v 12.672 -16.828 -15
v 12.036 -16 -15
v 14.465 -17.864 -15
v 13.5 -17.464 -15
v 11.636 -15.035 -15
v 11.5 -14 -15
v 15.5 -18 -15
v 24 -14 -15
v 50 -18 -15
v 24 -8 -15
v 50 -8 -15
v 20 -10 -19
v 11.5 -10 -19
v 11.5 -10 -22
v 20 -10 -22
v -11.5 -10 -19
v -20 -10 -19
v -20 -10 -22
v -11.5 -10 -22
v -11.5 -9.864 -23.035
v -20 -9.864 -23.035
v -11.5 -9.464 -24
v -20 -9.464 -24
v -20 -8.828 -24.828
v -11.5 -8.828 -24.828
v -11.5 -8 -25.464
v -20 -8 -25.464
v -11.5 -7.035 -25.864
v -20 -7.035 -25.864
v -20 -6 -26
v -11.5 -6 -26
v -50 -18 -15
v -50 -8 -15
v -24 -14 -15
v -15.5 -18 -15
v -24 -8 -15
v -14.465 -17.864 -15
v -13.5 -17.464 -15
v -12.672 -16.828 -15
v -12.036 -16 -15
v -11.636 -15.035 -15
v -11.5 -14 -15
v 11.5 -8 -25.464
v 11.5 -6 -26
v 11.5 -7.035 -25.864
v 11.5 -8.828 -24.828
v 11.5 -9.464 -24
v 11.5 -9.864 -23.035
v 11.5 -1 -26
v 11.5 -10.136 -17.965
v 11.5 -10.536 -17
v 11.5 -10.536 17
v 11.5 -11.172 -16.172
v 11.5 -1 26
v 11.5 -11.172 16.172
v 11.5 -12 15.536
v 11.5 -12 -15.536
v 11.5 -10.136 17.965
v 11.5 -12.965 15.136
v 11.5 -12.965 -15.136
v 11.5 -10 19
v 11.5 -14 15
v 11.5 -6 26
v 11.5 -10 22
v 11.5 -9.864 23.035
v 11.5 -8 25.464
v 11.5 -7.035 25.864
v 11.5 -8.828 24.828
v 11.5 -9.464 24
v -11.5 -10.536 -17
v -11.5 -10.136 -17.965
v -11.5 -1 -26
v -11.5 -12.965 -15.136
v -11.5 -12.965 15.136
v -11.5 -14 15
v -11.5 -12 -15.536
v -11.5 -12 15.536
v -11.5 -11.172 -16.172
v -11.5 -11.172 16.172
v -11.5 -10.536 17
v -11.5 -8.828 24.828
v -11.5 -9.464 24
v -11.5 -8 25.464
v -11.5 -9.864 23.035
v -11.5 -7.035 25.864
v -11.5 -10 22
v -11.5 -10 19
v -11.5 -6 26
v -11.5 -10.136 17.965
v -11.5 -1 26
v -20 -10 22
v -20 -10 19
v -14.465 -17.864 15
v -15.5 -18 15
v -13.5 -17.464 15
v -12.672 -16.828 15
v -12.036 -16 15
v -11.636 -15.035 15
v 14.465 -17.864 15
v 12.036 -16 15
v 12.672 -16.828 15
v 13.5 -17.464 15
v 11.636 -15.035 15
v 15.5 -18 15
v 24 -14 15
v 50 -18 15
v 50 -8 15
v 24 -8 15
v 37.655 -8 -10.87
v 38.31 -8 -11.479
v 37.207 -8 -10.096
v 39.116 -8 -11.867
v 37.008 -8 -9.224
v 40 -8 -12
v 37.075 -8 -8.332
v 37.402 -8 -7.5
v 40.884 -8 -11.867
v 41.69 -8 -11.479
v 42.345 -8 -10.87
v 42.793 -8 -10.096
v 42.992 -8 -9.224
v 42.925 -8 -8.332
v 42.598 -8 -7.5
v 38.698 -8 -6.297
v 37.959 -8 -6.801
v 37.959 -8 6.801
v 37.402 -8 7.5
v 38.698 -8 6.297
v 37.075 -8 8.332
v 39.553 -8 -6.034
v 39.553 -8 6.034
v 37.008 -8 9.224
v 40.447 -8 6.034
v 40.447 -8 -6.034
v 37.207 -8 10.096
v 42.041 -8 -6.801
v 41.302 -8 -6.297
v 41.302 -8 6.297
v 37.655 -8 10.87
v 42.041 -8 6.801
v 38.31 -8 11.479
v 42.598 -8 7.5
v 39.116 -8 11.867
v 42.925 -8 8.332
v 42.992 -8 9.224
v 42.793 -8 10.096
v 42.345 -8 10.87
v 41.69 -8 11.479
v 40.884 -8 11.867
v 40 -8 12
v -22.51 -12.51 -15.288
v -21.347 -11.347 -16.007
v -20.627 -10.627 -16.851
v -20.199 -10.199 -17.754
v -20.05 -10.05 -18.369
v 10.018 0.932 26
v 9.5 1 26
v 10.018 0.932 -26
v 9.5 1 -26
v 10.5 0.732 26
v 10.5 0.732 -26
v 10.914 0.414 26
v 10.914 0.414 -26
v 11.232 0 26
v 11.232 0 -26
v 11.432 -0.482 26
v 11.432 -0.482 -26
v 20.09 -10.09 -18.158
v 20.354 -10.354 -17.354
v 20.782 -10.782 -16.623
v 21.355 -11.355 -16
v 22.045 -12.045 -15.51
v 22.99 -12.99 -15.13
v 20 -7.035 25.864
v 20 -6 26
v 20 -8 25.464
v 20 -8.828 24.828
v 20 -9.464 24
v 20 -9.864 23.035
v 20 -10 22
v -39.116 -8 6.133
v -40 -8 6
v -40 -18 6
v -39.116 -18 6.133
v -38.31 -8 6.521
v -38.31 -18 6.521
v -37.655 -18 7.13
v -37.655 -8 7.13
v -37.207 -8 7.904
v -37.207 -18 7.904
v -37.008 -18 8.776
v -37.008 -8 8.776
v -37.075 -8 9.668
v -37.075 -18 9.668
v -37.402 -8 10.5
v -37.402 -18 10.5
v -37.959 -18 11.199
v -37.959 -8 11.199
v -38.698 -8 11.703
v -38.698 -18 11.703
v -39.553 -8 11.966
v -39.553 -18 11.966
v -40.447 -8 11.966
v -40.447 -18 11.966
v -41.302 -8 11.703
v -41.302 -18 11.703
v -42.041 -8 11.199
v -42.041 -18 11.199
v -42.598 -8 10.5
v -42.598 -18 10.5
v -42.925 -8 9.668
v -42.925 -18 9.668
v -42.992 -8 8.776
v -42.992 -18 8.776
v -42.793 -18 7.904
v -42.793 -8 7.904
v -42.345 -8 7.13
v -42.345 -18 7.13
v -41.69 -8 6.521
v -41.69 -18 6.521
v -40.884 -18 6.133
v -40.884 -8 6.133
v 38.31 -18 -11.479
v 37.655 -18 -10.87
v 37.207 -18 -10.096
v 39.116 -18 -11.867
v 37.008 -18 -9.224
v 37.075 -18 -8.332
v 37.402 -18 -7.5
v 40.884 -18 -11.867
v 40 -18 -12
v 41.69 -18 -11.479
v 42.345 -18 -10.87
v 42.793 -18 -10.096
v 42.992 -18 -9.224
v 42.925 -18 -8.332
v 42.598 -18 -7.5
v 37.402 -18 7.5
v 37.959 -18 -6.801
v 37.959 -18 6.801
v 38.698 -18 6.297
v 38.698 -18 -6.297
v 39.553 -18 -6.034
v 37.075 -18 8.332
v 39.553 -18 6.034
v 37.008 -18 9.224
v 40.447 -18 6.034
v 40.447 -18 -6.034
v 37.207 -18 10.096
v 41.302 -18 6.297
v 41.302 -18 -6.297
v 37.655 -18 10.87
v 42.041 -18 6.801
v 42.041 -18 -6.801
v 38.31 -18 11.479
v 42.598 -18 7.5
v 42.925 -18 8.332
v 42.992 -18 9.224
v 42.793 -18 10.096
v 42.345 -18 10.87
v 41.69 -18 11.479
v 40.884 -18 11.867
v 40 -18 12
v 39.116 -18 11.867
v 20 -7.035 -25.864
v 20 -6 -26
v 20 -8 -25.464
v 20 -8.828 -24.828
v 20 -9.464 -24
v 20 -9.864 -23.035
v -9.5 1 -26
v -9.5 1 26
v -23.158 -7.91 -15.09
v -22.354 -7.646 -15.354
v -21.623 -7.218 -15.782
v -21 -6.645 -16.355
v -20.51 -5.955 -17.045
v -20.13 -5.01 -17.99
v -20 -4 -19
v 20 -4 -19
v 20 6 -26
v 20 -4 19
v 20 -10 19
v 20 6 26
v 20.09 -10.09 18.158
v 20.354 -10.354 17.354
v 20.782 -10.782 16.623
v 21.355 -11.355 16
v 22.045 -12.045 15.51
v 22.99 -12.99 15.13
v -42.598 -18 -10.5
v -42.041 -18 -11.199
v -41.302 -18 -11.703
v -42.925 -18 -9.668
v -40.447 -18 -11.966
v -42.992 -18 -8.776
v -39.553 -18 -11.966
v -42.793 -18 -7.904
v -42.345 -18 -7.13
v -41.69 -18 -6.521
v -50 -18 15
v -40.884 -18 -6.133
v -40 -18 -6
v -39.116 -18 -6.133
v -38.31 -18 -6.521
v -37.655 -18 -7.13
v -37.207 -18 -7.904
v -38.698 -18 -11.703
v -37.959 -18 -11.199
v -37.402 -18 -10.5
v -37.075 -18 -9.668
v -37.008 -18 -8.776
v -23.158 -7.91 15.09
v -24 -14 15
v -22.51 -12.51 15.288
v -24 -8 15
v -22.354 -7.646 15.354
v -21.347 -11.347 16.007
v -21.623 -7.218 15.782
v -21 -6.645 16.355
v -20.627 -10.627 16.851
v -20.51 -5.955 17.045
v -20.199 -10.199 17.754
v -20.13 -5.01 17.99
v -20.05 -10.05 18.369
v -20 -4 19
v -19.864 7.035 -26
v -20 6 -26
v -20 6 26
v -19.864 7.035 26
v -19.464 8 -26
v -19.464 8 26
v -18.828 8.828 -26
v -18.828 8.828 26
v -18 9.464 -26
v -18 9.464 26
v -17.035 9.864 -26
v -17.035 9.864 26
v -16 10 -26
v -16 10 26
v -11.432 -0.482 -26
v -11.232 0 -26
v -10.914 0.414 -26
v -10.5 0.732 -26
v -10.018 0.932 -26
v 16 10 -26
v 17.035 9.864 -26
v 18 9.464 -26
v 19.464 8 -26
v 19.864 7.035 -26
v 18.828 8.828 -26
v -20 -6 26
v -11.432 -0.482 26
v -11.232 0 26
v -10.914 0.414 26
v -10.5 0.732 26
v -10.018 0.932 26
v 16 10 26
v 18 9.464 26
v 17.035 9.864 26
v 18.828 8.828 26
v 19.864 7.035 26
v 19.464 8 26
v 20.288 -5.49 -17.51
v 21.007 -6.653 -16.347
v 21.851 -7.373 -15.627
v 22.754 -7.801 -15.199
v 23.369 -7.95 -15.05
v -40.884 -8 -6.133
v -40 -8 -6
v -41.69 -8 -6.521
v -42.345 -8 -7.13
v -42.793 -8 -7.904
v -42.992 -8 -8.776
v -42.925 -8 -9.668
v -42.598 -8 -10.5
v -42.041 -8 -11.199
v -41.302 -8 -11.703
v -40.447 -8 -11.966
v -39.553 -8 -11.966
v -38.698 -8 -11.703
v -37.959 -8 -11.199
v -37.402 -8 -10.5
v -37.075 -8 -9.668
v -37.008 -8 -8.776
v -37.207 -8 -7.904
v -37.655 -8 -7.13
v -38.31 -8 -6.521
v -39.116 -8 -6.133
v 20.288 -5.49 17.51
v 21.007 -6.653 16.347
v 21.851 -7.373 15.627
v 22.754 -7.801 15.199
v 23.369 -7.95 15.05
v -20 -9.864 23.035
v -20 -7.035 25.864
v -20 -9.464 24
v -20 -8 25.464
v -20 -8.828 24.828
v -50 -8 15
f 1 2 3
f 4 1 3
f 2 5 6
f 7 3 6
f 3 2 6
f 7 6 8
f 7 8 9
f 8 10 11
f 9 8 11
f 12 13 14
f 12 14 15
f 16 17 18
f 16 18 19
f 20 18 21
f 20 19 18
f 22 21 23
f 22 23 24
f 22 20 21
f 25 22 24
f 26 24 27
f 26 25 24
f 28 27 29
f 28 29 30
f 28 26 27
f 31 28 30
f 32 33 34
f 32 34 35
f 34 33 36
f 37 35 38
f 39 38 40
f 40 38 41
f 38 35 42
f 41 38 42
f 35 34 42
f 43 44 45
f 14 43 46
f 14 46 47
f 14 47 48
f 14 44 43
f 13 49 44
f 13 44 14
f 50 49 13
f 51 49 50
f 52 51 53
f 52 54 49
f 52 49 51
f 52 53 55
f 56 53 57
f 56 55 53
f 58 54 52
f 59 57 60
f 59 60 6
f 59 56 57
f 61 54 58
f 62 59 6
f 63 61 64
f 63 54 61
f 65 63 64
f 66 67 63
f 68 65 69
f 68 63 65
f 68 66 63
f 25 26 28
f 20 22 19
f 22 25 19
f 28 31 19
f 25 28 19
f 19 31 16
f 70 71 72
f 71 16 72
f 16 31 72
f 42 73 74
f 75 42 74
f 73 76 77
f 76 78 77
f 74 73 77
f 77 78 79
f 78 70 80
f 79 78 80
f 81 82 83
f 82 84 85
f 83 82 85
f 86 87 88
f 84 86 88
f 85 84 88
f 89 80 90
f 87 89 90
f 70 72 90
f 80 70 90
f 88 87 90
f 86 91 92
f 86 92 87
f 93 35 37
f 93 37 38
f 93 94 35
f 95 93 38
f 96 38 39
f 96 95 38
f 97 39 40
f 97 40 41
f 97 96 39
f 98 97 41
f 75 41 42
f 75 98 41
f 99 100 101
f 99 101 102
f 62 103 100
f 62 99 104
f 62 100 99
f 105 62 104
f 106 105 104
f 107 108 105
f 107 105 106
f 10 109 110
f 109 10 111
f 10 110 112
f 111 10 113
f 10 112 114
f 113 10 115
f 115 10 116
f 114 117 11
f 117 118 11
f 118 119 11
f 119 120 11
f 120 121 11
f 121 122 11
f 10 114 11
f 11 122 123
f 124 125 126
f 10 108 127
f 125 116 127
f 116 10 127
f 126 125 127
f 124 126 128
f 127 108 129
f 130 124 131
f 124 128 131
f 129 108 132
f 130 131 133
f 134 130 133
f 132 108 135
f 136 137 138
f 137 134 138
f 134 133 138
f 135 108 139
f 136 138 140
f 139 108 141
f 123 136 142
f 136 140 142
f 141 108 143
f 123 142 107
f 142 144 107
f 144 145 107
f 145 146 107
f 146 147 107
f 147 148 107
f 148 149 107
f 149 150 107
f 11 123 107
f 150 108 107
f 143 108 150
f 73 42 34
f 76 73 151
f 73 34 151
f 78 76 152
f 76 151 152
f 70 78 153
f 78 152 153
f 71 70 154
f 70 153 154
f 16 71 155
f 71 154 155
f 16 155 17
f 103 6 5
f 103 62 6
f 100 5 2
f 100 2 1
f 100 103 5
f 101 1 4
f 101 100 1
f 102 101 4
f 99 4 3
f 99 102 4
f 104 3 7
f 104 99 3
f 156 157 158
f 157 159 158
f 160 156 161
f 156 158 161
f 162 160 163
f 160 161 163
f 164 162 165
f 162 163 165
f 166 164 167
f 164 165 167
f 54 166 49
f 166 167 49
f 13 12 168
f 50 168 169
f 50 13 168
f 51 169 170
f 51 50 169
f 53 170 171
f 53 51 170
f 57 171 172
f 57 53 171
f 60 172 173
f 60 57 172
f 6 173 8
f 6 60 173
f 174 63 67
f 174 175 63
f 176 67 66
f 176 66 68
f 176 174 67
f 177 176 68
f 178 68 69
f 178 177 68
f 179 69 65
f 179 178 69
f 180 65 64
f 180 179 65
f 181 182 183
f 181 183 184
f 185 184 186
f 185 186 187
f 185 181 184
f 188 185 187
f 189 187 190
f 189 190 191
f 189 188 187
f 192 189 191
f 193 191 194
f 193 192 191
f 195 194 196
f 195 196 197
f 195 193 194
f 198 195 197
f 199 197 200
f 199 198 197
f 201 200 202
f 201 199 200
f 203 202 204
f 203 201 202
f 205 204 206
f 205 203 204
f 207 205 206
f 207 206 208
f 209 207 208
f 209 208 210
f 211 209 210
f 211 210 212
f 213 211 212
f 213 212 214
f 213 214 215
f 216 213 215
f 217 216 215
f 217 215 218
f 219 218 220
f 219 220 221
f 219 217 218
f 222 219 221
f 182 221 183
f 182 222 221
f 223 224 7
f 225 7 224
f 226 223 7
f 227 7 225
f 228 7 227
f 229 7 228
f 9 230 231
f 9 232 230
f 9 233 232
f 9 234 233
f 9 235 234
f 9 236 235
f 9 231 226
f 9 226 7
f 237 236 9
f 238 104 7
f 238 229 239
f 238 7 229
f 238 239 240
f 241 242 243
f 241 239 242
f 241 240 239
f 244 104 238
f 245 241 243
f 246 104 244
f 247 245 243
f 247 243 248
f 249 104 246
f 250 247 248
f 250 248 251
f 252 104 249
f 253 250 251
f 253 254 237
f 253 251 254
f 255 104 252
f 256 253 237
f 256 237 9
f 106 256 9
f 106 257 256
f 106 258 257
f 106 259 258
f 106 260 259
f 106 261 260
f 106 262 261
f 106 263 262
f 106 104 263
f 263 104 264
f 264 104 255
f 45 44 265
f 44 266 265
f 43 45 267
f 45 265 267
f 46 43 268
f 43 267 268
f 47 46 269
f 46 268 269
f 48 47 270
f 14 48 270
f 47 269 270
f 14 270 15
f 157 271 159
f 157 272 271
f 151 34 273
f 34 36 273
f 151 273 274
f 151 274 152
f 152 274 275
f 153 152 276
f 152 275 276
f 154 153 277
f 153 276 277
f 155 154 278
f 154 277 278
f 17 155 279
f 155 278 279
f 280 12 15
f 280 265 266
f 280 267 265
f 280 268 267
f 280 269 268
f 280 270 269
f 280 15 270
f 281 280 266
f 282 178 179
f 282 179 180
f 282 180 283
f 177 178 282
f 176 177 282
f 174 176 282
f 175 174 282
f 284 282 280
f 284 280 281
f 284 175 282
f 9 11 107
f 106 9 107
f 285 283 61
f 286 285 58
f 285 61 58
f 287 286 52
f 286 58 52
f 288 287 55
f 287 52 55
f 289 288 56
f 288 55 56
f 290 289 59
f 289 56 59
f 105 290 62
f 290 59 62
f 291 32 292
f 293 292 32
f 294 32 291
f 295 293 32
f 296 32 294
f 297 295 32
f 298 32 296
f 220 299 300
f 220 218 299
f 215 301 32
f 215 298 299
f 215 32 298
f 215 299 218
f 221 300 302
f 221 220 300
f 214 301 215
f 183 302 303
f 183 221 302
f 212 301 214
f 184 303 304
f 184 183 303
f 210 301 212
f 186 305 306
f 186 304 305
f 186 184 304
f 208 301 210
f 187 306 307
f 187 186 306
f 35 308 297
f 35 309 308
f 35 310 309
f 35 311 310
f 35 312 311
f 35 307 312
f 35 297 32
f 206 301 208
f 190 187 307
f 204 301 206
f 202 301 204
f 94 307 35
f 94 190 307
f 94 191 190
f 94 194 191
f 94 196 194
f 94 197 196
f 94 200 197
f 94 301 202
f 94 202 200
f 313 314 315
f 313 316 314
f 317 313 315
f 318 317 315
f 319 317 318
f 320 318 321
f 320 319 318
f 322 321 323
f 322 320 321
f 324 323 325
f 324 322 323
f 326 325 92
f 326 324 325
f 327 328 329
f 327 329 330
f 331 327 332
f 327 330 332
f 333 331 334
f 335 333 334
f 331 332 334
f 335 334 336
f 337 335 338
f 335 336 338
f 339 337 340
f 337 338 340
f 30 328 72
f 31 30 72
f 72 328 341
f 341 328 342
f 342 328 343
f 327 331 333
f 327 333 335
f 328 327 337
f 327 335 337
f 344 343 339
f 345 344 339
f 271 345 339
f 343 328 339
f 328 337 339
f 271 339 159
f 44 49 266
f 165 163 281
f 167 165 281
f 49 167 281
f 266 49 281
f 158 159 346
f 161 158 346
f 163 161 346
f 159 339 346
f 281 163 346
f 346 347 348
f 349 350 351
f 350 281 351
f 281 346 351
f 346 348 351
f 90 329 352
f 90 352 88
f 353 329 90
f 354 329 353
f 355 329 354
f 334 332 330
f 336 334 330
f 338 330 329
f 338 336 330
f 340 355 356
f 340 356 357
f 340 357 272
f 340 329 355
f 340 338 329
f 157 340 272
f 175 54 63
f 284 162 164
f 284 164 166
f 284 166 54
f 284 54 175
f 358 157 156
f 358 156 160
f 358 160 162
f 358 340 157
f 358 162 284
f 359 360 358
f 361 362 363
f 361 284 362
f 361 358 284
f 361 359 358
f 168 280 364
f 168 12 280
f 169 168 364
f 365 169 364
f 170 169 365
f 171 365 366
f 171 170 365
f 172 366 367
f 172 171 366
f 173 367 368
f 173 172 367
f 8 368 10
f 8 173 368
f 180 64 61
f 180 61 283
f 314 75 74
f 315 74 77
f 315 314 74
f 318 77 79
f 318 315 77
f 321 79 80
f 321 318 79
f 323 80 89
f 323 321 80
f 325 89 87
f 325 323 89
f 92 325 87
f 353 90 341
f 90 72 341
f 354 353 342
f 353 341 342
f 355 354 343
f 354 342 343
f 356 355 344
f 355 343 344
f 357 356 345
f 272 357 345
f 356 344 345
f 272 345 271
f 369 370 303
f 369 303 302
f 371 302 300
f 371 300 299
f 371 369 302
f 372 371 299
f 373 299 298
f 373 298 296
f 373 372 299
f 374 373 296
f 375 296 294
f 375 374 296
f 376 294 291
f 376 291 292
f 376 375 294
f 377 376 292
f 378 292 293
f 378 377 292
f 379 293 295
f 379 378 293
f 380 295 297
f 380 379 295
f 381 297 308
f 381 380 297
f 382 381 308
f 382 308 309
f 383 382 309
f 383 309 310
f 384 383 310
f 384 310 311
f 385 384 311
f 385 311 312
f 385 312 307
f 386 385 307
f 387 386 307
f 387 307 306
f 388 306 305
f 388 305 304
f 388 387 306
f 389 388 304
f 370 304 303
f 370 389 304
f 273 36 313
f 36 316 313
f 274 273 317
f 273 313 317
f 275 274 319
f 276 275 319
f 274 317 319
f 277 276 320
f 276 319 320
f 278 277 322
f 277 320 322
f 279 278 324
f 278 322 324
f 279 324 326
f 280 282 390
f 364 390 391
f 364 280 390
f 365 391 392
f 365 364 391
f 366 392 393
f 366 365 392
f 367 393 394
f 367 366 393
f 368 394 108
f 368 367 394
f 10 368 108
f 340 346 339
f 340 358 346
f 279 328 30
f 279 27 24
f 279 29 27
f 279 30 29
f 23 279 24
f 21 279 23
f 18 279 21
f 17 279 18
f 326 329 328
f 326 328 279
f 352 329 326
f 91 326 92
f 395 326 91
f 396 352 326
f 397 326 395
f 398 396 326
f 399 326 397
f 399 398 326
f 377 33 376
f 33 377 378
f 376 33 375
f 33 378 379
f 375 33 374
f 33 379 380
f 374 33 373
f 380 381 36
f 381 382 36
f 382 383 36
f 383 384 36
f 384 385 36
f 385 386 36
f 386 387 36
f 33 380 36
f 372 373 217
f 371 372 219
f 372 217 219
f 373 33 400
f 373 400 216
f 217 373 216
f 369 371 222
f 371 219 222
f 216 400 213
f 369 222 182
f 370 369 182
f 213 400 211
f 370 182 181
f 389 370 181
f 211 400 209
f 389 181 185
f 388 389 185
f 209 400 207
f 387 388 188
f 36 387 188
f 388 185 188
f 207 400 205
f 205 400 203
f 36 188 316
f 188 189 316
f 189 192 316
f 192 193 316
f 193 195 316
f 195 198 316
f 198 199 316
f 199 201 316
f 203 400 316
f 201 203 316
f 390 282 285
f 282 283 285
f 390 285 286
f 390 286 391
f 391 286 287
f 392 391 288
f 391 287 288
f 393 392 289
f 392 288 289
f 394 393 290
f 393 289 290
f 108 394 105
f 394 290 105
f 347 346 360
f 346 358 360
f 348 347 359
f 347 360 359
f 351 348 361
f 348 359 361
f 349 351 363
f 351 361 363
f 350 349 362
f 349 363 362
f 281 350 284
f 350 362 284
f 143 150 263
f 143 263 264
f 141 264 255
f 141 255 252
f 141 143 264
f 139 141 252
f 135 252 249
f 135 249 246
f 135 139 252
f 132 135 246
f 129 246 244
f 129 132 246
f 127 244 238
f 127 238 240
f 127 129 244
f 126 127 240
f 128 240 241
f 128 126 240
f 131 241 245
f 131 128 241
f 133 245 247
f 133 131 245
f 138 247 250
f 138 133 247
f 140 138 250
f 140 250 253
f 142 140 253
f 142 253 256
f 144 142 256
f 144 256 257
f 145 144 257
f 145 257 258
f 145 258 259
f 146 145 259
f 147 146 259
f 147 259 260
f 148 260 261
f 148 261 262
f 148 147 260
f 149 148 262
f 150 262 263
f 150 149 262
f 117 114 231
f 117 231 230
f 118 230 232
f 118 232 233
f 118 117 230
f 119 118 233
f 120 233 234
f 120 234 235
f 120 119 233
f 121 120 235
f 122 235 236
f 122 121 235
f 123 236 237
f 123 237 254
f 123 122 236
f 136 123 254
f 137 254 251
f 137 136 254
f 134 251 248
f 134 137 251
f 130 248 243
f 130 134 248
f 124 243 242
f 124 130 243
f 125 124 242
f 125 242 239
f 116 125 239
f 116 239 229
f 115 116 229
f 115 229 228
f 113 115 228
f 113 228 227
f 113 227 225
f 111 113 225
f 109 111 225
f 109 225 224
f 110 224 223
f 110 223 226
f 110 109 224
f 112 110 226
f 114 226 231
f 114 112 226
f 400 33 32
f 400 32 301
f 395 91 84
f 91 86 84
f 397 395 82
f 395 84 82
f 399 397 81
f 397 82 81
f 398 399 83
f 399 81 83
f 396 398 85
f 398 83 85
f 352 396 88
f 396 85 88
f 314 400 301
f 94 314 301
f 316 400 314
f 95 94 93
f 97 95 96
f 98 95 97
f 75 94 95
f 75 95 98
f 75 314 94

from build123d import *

# Parameters (mm, degrees)
EXTRUDE_1_DEPTH      = 26
EXTRUDE_2_DEPTH      = 8
EXTRUDE_2_DEPTH_BACK = 2
SKETCH_2_W           = 38.5
SKETCH_2_H           = 30
SKETCH_2_R           = 3
FILLET_1_R           = 4
FILLET_2_R           = 4
FILLET_3_R           = 2


with BuildPart() as part:
    # 草圖1 → 填料-伸長1 (new, symmetric)
    with BuildSketch(Plane.XY):
        Polygon((11.5, 1), (11.5, -10), (20, -10), (20, 10), (-20, 10), (-20, -10), (-11.5, -10), (-11.5, 1), align=None)
    extrude(amount=EXTRUDE_1_DEPTH, both=True)

    # 草圖2 → 填料-伸長2 (add, two sides: drawn at the far end of the back side and taken through both)
    # profile 1 of 2: a face of its own
    with BuildSketch(Plane.XZ.offset(10).offset(-EXTRUDE_2_DEPTH_BACK)):
        with Locations((-30.75, 0)):
            Rectangle(SKETCH_2_W, SKETCH_2_H)
        with Locations(Location((-40, 9, 0), (0, 0, 270))):
            Circle(SKETCH_2_R, mode=Mode.SUBTRACT)
        with Locations(Location((-40, -9, 0), (0, 0, 90))):
            Circle(SKETCH_2_R, mode=Mode.SUBTRACT)
    # profile 2 of 2: a face of its own
    with BuildSketch(Plane.XZ.offset(10).offset(-EXTRUDE_2_DEPTH_BACK)):
        with Locations((30.75, 0)):
            Rectangle(SKETCH_2_W, SKETCH_2_H)
        with Locations(Location((40, 9, 0), (0, 0, 90))):
            Circle(SKETCH_2_R, mode=Mode.SUBTRACT)
        with Locations(Location((40, -9, 0), (0, 0, 270))):
            Circle(SKETCH_2_R, mode=Mode.SUBTRACT)
    extrude(amount=EXTRUDE_2_DEPTH + EXTRUDE_2_DEPTH_BACK)

    # 圓角1
    fillet_1_edges = [part.edges().sort_by_distance(p)[0] for p in [
        (20, 10, 0),
        (-20, 10, 0),
        (-11.5, -18, 0),
        (-20, -8, 0),
        (-15.75, -10, -15),
        (15.75, -10, -15),
        (-15.75, -10, 15),
        (15.75, -10, 15),
        (20, -8, 0),
        (11.5, -18, 0),
        (-20, -9, 15),
        (-20, -9, -15),
        (20, -9, -15),
        (20, -9, 15),
    ]]
    fillet(fillet_1_edges, radius=FILLET_1_R - 0.0001)  # a hair under: the kernel refuses the full size

    # 圓角2
    fillet_2_edges = [part.edges().sort_by_distance(p)[0] for p in [
        (-15.75, -10, -26),
        (15.75, -10, 26),
        (15.75, -10, -26),
        (-15.75, -10, 26),
    ]]
    fillet(fillet_2_edges, radius=FILLET_2_R)

    # 圓角3
    fillet_3_edges = [part.edges().sort_by_distance(p)[0] for p in [
        (11.5, 1, 0),
        (-11.5, 1, 0),
    ]]
    fillet(fillet_3_edges, radius=FILLET_3_R)


solid = part.part
